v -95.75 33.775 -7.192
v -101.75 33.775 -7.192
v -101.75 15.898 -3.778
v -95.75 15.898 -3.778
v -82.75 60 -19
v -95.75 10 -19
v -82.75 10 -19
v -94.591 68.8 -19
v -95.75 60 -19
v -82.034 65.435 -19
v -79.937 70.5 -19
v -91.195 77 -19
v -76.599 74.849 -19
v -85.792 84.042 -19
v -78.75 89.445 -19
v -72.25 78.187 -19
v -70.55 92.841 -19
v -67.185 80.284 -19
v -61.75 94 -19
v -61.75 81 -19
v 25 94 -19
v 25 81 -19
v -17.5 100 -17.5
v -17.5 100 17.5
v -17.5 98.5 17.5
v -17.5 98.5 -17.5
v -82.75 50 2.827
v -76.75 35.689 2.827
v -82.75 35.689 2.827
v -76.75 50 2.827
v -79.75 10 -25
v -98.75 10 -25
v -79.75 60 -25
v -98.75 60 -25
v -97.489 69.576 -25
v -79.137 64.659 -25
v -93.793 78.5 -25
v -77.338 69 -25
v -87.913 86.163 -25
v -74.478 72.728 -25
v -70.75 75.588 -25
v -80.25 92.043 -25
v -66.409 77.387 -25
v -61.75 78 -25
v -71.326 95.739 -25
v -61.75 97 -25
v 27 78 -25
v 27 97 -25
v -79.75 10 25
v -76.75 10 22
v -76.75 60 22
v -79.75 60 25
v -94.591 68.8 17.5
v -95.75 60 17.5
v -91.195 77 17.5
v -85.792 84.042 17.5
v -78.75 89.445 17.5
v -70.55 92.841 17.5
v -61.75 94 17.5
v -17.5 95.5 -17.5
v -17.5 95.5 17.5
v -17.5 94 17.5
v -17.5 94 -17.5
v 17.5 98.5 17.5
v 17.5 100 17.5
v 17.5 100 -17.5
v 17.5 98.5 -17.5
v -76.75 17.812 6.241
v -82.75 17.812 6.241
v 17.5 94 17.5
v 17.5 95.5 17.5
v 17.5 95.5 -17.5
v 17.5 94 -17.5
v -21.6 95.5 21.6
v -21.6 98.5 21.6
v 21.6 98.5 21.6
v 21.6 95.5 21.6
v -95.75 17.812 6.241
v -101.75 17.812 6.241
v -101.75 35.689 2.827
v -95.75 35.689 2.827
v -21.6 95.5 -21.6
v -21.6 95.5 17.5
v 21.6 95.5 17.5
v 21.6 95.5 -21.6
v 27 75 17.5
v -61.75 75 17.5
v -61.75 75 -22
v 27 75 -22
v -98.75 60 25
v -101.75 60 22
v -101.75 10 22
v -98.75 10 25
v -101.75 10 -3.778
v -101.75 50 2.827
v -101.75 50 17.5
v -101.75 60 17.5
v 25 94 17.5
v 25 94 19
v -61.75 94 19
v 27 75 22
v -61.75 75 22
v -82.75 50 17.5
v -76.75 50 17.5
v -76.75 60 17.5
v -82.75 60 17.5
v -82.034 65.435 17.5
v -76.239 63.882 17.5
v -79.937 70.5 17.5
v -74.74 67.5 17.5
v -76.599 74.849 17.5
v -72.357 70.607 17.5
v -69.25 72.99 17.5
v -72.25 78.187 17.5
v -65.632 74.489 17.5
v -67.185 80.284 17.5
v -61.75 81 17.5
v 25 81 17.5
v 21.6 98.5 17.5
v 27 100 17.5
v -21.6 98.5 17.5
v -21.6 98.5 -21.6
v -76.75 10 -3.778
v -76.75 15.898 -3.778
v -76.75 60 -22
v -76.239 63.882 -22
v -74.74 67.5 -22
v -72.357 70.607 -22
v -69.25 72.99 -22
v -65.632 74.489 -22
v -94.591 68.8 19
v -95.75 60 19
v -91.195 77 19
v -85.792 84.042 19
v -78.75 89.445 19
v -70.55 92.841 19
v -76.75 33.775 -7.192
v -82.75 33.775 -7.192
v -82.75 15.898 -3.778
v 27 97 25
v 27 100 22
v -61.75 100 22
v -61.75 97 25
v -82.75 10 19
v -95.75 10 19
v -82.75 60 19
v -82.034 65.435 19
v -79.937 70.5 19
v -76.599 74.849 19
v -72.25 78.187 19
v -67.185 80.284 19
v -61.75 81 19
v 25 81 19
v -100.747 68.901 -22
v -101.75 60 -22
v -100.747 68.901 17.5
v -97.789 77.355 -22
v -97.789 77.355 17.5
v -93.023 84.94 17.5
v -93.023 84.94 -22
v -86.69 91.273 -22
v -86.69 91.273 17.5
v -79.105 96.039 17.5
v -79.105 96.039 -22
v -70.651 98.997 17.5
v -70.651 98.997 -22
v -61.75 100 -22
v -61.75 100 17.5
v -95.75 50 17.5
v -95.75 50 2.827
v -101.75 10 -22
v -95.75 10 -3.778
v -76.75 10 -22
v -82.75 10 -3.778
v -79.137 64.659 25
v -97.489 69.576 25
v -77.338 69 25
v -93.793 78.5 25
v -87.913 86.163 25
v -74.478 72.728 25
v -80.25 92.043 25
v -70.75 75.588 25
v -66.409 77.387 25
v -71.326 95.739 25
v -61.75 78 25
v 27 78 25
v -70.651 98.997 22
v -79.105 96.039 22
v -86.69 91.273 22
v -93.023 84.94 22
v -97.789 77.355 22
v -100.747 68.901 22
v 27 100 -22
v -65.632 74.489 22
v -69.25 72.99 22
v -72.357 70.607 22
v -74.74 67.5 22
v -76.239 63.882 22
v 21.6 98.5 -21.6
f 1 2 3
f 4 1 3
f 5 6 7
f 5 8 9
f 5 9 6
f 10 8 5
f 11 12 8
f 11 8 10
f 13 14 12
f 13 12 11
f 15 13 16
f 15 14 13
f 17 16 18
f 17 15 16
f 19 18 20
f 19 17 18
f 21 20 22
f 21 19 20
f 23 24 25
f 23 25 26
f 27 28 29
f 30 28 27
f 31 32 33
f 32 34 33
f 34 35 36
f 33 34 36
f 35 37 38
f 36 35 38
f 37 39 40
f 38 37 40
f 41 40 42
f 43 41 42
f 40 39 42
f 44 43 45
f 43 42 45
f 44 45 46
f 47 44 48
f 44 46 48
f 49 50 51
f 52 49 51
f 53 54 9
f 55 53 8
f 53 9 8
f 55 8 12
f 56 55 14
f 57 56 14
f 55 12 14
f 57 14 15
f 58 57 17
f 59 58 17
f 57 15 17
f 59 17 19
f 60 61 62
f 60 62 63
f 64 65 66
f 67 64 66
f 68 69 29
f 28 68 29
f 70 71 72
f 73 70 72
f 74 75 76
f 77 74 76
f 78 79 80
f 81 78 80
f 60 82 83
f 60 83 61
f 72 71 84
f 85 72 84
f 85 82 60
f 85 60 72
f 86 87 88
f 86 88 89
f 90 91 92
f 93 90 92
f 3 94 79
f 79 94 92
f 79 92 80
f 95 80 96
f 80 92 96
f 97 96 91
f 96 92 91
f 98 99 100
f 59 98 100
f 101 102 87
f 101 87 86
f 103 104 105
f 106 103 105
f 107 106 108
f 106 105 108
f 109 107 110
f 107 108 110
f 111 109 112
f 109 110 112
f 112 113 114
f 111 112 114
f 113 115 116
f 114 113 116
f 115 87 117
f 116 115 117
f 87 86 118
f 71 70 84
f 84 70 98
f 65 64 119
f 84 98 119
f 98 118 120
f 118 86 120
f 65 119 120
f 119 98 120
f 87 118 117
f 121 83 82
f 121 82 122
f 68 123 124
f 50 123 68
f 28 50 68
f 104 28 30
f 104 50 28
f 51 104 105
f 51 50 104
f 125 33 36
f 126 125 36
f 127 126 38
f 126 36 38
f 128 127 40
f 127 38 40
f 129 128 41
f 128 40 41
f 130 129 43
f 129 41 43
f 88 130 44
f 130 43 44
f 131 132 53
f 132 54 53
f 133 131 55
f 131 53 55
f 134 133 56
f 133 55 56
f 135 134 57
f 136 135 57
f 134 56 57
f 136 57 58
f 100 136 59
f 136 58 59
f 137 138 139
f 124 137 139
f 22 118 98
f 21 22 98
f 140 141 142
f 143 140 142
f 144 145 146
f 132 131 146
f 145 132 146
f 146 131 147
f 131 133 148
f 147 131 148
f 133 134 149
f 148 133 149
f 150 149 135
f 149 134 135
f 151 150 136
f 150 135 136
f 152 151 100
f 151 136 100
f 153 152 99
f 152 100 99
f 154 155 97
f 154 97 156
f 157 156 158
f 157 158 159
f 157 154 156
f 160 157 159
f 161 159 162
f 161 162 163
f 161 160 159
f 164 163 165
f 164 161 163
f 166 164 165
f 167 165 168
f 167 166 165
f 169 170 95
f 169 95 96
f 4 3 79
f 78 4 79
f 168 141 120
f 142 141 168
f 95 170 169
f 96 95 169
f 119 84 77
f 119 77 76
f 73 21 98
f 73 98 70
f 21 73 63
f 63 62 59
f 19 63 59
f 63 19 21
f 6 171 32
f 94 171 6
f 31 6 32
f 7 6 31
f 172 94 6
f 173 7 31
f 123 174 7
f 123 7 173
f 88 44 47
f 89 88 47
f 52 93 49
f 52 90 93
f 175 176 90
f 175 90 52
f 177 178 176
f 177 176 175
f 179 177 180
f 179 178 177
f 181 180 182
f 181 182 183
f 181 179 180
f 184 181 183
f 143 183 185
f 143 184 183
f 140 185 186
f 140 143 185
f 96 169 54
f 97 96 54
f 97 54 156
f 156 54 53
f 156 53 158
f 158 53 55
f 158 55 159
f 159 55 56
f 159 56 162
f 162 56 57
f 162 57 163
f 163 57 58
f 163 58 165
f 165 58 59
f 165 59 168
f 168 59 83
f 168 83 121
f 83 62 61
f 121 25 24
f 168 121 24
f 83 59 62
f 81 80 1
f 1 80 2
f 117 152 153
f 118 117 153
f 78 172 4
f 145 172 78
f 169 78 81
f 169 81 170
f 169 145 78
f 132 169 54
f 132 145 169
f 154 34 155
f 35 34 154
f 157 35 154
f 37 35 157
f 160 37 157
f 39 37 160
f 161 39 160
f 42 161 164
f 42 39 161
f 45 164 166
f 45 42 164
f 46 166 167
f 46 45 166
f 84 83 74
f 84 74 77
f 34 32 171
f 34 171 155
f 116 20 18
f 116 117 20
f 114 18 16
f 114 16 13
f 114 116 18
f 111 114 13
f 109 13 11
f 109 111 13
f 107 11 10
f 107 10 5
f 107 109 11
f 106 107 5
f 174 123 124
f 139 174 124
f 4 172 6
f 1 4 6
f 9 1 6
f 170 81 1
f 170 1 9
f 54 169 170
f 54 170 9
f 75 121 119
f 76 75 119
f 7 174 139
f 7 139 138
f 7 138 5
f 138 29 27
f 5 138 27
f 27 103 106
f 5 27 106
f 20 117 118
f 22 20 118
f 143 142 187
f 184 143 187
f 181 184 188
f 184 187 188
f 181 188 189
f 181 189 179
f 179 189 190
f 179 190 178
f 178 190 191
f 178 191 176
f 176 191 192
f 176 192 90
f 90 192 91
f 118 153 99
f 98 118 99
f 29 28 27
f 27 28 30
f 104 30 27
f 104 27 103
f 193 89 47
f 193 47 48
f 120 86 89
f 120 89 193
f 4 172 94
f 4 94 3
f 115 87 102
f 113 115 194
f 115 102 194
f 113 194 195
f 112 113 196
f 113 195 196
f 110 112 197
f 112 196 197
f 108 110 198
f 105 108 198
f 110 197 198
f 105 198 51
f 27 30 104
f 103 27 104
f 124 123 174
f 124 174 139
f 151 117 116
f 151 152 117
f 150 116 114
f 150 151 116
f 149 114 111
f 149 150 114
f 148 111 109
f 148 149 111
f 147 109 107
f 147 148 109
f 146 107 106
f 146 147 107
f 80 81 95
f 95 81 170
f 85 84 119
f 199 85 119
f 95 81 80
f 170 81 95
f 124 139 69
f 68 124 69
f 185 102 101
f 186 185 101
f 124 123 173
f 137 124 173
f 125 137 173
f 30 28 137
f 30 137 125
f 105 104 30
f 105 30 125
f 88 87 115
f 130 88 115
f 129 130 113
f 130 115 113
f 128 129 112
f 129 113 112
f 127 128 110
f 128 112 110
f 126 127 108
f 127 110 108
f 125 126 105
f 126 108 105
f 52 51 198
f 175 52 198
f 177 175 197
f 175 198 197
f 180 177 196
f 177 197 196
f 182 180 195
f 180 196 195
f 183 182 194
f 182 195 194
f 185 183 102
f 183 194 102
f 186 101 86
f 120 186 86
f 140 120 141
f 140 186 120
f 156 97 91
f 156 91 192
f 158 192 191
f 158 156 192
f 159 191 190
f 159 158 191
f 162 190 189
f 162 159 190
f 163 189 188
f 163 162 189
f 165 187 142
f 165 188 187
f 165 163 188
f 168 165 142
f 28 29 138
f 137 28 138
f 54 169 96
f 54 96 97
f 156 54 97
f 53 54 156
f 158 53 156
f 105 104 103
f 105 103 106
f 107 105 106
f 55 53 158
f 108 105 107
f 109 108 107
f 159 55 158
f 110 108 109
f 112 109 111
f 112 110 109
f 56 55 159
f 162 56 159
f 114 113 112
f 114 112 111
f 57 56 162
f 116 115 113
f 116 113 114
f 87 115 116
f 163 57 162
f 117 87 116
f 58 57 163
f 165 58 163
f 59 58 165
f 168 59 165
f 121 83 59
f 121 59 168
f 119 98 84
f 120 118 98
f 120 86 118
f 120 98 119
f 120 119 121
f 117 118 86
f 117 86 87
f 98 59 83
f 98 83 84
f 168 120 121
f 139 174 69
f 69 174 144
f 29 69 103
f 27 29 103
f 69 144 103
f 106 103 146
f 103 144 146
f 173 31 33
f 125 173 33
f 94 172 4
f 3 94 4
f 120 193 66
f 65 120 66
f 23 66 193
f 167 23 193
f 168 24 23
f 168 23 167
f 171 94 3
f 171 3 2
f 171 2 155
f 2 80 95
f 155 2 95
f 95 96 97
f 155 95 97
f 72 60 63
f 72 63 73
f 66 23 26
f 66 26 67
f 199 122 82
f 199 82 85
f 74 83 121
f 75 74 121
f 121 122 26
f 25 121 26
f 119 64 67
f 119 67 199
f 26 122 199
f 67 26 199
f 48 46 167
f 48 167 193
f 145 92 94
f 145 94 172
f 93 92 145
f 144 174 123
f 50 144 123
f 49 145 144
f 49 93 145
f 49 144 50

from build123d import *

# Parameters (mm, degrees)
BOSS_EXTRUDE1_DEPTH       = 25
FILLET2_R                 = 15
FILLET3_R                 = 40
FILLET1_SIZE              = 3
SHELL1_T                  = -6
SHELL1_THICKNESS_2_FACE_W = 13
SHELL1_THICKNESS_2_FACE_H = 38
SHELL1_THICKNESS_2_DEPTH  = 4
CUT_EXTRUDE1_DEPTH        = 165.928961981
CUT_EXTRUDE2_REACH        = 140.123
SKETCH3_W                 = 35
SKETCH3_H                 = 35
CUT_EXTRUDE3_DEPTH        = 39.1
CUT_EXTRUDE3_DEPTH_BACK   = 4.1
SKETCH4_W                 = 43.2
SKETCH4_H                 = 3
SPLIT1_SURFACE_1_BACK     = 165.853
SPLIT1_SURFACE_1_DEPTH    = 331.706
SPLIT1_SURFACE_2_BACK     = 165.853
SPLIT1_SURFACE_2_DEPTH    = 331.706


with BuildPart() as part:
    # Sketch1 → Boss-Extrude1 (new, symmetric)
    with BuildSketch(Plane.XY):
        Polygon((-101.75, 10), (-76.75, 10), (-76.75, 75), (27, 75), (27, 100), (-101.75, 100), align=None)
    extrude(amount=BOSS_EXTRUDE1_DEPTH, both=True)

    # Fillet2
    fillet2_edges = [part.edges().sort_by_distance(p)[0] for p in [
        (-76.75, 75, 0),
    ]]
    fillet(fillet2_edges, radius=FILLET2_R)

    # Fillet3
    fillet3_edges = [part.edges().sort_by_distance(p)[0] for p in [
        (-101.75, 100, 0),
    ]]
    fillet(fillet3_edges, radius=FILLET3_R)

    # Fillet1
    fillet1_edges = [part.edges().sort_by_distance(p)[0] for p in [
        (-17.375, 75, -25),
        (-17.375, 100, -25),
        (-17.375, 100, 25),
        (-17.375, 75, 25),
        (-101.75, 35, -25),
        (-101.75, 35, 25),
        (-76.75, 35, -25),
        (-76.75, 35, 25),
        (-90.034271247, 88.284271247, -25),
        (-90.034271247, 88.284271247, 25),
        (-72.356601718, 70.606601718, -25),
        (-72.356601718, 70.606601718, 25),
    ]]
    chamfer(fillet1_edges, length=FILLET1_SIZE)

    # Shell1
    shell1_openings = [part.faces().sort_by_distance(p)[0] for p in [
        (-89.25, 10, 0),
    ]]
    offset(amount=SHELL1_T, openings=shell1_openings)

    # Shell1 thickness 2 face (on inner face of the shell) → Shell1 thickness 2 (cut)
    with BuildSketch(Plane(origin=(21, 87.5, 0), x_dir=(0, 1, 0), z_dir=(1, 0, 0))):
        Rectangle(SHELL1_THICKNESS_2_FACE_W, SHELL1_THICKNESS_2_FACE_H)
    extrude(amount=SHELL1_THICKNESS_2_DEPTH, mode=Mode.SUBTRACT)

    # Sketch2 → Cut-Extrude1 (cut, through all)
    with BuildSketch(Plane.ZY.offset(101.75)):
        Polygon((-3.777731527, 15.89847996), (6.241187326, 17.811923196), (2.827004193, 35.688818166), (-7.19191466, 33.77537493), align=None)
    extrude(amount=-CUT_EXTRUDE1_DEPTH, mode=Mode.SUBTRACT)

    # Sketch3 → Cut-Extrude2 (cut, up to next)
    with BuildSketch(Plane(origin=(0, 100, 0), x_dir=(1, 0, 0), z_dir=(0, 1, 0)), mode=Mode.PRIVATE) as cut_extrude2_sk1:
        Rectangle(SKETCH3_W, SKETCH3_H)
    cut_extrude2_tool1 = extrude(cut_extrude2_sk1.sketch, amount=-CUT_EXTRUDE2_REACH, mode=Mode.PRIVATE) & part.part
    add(cut_extrude2_tool1.solids().sort_by_distance((0, 100, 0))[0], mode=Mode.SUBTRACT)

    # Sketch4 → Cut-Extrude3 (cut, two sides: drawn at the far end of the back side and taken through both)
    with BuildSketch(Plane.XY.offset(-17.5).offset(-CUT_EXTRUDE3_DEPTH_BACK)):
        with Locations((0, 97)):
            Rectangle(SKETCH4_W, SKETCH4_H)
    extrude(amount=CUT_EXTRUDE3_DEPTH + CUT_EXTRUDE3_DEPTH_BACK, mode=Mode.SUBTRACT)


with BuildPart() as body_2:
    # Split1: the piece behind the surface
    add(part.part)
    # Split1 surface: a surface, the sketch's curves swept straight by 331.706 mm
    with BuildLine(Plane.ZY.offset(101.75).offset(-SPLIT1_SURFACE_1_BACK), mode=Mode.PRIVATE) as split1_surface_1_path:
        Line((-3.777731527, 10), (-3.777731527, 15.89847996))
        Line((-3.777731527, 15.89847996), (2.827004193, 35.688818166))
        Line((2.827004193, 35.688818166), (2.827004193, 50))
        Line((2.827004193, 50), (17.5, 50))
        Line((17.5, 50), (17.5, 116.794705416))
    split1_surface_1 = Shell.extrude(split1_surface_1_path.wire(), (-1 * SPLIT1_SURFACE_1_DEPTH, 0 * SPLIT1_SURFACE_1_DEPTH, 0 * SPLIT1_SURFACE_1_DEPTH))
    split(bisect_by=split1_surface_1, keep=Keep.BOTTOM)


with BuildPart() as part_1:
    add(part.part)

    # Split1: split by a surface, the side it looks to stays
    # Split1 surface: a surface, the sketch's curves swept straight by 331.706 mm
    with BuildLine(Plane.ZY.offset(101.75).offset(-SPLIT1_SURFACE_2_BACK), mode=Mode.PRIVATE) as split1_surface_2_path:
        Line((-3.777731527, 10), (-3.777731527, 15.89847996))
        Line((-3.777731527, 15.89847996), (2.827004193, 35.688818166))
        Line((2.827004193, 35.688818166), (2.827004193, 50))
        Line((2.827004193, 50), (17.5, 50))
        Line((17.5, 50), (17.5, 116.794705416))
    split1_surface_2 = Shell.extrude(split1_surface_2_path.wire(), (-1 * SPLIT1_SURFACE_2_DEPTH, 0 * SPLIT1_SURFACE_2_DEPTH, 0 * SPLIT1_SURFACE_2_DEPTH))
    split(bisect_by=split1_surface_2, keep=Keep.TOP)


solid = Compound([body_2.part, part_1.part])
